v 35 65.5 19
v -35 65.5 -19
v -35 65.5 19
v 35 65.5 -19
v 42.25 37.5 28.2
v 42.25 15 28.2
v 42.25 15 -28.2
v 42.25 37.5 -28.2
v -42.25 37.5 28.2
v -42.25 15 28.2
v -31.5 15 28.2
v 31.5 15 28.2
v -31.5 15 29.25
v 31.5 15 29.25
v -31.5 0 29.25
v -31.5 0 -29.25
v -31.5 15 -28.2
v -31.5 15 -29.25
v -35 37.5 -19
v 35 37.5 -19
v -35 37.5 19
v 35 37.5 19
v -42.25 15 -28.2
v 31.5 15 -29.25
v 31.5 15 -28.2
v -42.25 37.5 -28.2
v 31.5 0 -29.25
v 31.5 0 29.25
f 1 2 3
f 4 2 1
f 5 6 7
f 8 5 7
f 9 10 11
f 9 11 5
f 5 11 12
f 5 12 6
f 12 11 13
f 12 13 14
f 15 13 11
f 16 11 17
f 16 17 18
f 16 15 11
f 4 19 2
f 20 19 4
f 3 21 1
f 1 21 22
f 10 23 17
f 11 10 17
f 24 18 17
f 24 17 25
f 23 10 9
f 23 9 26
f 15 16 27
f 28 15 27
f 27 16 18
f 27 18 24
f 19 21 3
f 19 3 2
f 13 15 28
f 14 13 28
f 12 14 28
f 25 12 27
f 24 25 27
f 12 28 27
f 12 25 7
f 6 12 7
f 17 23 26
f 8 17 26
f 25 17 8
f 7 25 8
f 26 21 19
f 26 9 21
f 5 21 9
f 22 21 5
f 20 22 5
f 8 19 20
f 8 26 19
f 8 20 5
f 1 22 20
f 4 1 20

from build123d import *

# Parameters (mm, degrees)
SKETCH1_W           = 63
SKETCH1_H           = 58.5
BOSS_EXTRUDE1_DEPTH = 15
SKETCH2_W           = 84.5
SKETCH2_H           = 56.4
BOSS_EXTRUDE2_DEPTH = 22.5
SKETCH3_W           = 70
SKETCH3_H           = 38
BOSS_EXTRUDE3_DEPTH = 28


with BuildPart() as part:
    # Sketch1 → Boss-Extrude1 (new body)
    with BuildSketch(Plane(origin=(0, 0, 0), x_dir=(1, 0, 0), z_dir=(0, 1, 0))):
        Rectangle(SKETCH1_W, SKETCH1_H)
    extrude(amount=BOSS_EXTRUDE1_DEPTH)

    # Sketch2 → Boss-Extrude2 (add)
    with BuildSketch(Plane(origin=(0, 15, 0), x_dir=(1, 0, 0), z_dir=(0, 1, 0))):
        Rectangle(SKETCH2_W, SKETCH2_H)
    extrude(amount=BOSS_EXTRUDE2_DEPTH)

    # Sketch3 → Boss-Extrude3 (add)
    with BuildSketch(Plane(origin=(0, 37.5, 0), x_dir=(1, 0, 0), z_dir=(0, 1, 0))):
        Rectangle(SKETCH3_W, SKETCH3_H)
    extrude(amount=BOSS_EXTRUDE3_DEPTH)


solid = part.part
